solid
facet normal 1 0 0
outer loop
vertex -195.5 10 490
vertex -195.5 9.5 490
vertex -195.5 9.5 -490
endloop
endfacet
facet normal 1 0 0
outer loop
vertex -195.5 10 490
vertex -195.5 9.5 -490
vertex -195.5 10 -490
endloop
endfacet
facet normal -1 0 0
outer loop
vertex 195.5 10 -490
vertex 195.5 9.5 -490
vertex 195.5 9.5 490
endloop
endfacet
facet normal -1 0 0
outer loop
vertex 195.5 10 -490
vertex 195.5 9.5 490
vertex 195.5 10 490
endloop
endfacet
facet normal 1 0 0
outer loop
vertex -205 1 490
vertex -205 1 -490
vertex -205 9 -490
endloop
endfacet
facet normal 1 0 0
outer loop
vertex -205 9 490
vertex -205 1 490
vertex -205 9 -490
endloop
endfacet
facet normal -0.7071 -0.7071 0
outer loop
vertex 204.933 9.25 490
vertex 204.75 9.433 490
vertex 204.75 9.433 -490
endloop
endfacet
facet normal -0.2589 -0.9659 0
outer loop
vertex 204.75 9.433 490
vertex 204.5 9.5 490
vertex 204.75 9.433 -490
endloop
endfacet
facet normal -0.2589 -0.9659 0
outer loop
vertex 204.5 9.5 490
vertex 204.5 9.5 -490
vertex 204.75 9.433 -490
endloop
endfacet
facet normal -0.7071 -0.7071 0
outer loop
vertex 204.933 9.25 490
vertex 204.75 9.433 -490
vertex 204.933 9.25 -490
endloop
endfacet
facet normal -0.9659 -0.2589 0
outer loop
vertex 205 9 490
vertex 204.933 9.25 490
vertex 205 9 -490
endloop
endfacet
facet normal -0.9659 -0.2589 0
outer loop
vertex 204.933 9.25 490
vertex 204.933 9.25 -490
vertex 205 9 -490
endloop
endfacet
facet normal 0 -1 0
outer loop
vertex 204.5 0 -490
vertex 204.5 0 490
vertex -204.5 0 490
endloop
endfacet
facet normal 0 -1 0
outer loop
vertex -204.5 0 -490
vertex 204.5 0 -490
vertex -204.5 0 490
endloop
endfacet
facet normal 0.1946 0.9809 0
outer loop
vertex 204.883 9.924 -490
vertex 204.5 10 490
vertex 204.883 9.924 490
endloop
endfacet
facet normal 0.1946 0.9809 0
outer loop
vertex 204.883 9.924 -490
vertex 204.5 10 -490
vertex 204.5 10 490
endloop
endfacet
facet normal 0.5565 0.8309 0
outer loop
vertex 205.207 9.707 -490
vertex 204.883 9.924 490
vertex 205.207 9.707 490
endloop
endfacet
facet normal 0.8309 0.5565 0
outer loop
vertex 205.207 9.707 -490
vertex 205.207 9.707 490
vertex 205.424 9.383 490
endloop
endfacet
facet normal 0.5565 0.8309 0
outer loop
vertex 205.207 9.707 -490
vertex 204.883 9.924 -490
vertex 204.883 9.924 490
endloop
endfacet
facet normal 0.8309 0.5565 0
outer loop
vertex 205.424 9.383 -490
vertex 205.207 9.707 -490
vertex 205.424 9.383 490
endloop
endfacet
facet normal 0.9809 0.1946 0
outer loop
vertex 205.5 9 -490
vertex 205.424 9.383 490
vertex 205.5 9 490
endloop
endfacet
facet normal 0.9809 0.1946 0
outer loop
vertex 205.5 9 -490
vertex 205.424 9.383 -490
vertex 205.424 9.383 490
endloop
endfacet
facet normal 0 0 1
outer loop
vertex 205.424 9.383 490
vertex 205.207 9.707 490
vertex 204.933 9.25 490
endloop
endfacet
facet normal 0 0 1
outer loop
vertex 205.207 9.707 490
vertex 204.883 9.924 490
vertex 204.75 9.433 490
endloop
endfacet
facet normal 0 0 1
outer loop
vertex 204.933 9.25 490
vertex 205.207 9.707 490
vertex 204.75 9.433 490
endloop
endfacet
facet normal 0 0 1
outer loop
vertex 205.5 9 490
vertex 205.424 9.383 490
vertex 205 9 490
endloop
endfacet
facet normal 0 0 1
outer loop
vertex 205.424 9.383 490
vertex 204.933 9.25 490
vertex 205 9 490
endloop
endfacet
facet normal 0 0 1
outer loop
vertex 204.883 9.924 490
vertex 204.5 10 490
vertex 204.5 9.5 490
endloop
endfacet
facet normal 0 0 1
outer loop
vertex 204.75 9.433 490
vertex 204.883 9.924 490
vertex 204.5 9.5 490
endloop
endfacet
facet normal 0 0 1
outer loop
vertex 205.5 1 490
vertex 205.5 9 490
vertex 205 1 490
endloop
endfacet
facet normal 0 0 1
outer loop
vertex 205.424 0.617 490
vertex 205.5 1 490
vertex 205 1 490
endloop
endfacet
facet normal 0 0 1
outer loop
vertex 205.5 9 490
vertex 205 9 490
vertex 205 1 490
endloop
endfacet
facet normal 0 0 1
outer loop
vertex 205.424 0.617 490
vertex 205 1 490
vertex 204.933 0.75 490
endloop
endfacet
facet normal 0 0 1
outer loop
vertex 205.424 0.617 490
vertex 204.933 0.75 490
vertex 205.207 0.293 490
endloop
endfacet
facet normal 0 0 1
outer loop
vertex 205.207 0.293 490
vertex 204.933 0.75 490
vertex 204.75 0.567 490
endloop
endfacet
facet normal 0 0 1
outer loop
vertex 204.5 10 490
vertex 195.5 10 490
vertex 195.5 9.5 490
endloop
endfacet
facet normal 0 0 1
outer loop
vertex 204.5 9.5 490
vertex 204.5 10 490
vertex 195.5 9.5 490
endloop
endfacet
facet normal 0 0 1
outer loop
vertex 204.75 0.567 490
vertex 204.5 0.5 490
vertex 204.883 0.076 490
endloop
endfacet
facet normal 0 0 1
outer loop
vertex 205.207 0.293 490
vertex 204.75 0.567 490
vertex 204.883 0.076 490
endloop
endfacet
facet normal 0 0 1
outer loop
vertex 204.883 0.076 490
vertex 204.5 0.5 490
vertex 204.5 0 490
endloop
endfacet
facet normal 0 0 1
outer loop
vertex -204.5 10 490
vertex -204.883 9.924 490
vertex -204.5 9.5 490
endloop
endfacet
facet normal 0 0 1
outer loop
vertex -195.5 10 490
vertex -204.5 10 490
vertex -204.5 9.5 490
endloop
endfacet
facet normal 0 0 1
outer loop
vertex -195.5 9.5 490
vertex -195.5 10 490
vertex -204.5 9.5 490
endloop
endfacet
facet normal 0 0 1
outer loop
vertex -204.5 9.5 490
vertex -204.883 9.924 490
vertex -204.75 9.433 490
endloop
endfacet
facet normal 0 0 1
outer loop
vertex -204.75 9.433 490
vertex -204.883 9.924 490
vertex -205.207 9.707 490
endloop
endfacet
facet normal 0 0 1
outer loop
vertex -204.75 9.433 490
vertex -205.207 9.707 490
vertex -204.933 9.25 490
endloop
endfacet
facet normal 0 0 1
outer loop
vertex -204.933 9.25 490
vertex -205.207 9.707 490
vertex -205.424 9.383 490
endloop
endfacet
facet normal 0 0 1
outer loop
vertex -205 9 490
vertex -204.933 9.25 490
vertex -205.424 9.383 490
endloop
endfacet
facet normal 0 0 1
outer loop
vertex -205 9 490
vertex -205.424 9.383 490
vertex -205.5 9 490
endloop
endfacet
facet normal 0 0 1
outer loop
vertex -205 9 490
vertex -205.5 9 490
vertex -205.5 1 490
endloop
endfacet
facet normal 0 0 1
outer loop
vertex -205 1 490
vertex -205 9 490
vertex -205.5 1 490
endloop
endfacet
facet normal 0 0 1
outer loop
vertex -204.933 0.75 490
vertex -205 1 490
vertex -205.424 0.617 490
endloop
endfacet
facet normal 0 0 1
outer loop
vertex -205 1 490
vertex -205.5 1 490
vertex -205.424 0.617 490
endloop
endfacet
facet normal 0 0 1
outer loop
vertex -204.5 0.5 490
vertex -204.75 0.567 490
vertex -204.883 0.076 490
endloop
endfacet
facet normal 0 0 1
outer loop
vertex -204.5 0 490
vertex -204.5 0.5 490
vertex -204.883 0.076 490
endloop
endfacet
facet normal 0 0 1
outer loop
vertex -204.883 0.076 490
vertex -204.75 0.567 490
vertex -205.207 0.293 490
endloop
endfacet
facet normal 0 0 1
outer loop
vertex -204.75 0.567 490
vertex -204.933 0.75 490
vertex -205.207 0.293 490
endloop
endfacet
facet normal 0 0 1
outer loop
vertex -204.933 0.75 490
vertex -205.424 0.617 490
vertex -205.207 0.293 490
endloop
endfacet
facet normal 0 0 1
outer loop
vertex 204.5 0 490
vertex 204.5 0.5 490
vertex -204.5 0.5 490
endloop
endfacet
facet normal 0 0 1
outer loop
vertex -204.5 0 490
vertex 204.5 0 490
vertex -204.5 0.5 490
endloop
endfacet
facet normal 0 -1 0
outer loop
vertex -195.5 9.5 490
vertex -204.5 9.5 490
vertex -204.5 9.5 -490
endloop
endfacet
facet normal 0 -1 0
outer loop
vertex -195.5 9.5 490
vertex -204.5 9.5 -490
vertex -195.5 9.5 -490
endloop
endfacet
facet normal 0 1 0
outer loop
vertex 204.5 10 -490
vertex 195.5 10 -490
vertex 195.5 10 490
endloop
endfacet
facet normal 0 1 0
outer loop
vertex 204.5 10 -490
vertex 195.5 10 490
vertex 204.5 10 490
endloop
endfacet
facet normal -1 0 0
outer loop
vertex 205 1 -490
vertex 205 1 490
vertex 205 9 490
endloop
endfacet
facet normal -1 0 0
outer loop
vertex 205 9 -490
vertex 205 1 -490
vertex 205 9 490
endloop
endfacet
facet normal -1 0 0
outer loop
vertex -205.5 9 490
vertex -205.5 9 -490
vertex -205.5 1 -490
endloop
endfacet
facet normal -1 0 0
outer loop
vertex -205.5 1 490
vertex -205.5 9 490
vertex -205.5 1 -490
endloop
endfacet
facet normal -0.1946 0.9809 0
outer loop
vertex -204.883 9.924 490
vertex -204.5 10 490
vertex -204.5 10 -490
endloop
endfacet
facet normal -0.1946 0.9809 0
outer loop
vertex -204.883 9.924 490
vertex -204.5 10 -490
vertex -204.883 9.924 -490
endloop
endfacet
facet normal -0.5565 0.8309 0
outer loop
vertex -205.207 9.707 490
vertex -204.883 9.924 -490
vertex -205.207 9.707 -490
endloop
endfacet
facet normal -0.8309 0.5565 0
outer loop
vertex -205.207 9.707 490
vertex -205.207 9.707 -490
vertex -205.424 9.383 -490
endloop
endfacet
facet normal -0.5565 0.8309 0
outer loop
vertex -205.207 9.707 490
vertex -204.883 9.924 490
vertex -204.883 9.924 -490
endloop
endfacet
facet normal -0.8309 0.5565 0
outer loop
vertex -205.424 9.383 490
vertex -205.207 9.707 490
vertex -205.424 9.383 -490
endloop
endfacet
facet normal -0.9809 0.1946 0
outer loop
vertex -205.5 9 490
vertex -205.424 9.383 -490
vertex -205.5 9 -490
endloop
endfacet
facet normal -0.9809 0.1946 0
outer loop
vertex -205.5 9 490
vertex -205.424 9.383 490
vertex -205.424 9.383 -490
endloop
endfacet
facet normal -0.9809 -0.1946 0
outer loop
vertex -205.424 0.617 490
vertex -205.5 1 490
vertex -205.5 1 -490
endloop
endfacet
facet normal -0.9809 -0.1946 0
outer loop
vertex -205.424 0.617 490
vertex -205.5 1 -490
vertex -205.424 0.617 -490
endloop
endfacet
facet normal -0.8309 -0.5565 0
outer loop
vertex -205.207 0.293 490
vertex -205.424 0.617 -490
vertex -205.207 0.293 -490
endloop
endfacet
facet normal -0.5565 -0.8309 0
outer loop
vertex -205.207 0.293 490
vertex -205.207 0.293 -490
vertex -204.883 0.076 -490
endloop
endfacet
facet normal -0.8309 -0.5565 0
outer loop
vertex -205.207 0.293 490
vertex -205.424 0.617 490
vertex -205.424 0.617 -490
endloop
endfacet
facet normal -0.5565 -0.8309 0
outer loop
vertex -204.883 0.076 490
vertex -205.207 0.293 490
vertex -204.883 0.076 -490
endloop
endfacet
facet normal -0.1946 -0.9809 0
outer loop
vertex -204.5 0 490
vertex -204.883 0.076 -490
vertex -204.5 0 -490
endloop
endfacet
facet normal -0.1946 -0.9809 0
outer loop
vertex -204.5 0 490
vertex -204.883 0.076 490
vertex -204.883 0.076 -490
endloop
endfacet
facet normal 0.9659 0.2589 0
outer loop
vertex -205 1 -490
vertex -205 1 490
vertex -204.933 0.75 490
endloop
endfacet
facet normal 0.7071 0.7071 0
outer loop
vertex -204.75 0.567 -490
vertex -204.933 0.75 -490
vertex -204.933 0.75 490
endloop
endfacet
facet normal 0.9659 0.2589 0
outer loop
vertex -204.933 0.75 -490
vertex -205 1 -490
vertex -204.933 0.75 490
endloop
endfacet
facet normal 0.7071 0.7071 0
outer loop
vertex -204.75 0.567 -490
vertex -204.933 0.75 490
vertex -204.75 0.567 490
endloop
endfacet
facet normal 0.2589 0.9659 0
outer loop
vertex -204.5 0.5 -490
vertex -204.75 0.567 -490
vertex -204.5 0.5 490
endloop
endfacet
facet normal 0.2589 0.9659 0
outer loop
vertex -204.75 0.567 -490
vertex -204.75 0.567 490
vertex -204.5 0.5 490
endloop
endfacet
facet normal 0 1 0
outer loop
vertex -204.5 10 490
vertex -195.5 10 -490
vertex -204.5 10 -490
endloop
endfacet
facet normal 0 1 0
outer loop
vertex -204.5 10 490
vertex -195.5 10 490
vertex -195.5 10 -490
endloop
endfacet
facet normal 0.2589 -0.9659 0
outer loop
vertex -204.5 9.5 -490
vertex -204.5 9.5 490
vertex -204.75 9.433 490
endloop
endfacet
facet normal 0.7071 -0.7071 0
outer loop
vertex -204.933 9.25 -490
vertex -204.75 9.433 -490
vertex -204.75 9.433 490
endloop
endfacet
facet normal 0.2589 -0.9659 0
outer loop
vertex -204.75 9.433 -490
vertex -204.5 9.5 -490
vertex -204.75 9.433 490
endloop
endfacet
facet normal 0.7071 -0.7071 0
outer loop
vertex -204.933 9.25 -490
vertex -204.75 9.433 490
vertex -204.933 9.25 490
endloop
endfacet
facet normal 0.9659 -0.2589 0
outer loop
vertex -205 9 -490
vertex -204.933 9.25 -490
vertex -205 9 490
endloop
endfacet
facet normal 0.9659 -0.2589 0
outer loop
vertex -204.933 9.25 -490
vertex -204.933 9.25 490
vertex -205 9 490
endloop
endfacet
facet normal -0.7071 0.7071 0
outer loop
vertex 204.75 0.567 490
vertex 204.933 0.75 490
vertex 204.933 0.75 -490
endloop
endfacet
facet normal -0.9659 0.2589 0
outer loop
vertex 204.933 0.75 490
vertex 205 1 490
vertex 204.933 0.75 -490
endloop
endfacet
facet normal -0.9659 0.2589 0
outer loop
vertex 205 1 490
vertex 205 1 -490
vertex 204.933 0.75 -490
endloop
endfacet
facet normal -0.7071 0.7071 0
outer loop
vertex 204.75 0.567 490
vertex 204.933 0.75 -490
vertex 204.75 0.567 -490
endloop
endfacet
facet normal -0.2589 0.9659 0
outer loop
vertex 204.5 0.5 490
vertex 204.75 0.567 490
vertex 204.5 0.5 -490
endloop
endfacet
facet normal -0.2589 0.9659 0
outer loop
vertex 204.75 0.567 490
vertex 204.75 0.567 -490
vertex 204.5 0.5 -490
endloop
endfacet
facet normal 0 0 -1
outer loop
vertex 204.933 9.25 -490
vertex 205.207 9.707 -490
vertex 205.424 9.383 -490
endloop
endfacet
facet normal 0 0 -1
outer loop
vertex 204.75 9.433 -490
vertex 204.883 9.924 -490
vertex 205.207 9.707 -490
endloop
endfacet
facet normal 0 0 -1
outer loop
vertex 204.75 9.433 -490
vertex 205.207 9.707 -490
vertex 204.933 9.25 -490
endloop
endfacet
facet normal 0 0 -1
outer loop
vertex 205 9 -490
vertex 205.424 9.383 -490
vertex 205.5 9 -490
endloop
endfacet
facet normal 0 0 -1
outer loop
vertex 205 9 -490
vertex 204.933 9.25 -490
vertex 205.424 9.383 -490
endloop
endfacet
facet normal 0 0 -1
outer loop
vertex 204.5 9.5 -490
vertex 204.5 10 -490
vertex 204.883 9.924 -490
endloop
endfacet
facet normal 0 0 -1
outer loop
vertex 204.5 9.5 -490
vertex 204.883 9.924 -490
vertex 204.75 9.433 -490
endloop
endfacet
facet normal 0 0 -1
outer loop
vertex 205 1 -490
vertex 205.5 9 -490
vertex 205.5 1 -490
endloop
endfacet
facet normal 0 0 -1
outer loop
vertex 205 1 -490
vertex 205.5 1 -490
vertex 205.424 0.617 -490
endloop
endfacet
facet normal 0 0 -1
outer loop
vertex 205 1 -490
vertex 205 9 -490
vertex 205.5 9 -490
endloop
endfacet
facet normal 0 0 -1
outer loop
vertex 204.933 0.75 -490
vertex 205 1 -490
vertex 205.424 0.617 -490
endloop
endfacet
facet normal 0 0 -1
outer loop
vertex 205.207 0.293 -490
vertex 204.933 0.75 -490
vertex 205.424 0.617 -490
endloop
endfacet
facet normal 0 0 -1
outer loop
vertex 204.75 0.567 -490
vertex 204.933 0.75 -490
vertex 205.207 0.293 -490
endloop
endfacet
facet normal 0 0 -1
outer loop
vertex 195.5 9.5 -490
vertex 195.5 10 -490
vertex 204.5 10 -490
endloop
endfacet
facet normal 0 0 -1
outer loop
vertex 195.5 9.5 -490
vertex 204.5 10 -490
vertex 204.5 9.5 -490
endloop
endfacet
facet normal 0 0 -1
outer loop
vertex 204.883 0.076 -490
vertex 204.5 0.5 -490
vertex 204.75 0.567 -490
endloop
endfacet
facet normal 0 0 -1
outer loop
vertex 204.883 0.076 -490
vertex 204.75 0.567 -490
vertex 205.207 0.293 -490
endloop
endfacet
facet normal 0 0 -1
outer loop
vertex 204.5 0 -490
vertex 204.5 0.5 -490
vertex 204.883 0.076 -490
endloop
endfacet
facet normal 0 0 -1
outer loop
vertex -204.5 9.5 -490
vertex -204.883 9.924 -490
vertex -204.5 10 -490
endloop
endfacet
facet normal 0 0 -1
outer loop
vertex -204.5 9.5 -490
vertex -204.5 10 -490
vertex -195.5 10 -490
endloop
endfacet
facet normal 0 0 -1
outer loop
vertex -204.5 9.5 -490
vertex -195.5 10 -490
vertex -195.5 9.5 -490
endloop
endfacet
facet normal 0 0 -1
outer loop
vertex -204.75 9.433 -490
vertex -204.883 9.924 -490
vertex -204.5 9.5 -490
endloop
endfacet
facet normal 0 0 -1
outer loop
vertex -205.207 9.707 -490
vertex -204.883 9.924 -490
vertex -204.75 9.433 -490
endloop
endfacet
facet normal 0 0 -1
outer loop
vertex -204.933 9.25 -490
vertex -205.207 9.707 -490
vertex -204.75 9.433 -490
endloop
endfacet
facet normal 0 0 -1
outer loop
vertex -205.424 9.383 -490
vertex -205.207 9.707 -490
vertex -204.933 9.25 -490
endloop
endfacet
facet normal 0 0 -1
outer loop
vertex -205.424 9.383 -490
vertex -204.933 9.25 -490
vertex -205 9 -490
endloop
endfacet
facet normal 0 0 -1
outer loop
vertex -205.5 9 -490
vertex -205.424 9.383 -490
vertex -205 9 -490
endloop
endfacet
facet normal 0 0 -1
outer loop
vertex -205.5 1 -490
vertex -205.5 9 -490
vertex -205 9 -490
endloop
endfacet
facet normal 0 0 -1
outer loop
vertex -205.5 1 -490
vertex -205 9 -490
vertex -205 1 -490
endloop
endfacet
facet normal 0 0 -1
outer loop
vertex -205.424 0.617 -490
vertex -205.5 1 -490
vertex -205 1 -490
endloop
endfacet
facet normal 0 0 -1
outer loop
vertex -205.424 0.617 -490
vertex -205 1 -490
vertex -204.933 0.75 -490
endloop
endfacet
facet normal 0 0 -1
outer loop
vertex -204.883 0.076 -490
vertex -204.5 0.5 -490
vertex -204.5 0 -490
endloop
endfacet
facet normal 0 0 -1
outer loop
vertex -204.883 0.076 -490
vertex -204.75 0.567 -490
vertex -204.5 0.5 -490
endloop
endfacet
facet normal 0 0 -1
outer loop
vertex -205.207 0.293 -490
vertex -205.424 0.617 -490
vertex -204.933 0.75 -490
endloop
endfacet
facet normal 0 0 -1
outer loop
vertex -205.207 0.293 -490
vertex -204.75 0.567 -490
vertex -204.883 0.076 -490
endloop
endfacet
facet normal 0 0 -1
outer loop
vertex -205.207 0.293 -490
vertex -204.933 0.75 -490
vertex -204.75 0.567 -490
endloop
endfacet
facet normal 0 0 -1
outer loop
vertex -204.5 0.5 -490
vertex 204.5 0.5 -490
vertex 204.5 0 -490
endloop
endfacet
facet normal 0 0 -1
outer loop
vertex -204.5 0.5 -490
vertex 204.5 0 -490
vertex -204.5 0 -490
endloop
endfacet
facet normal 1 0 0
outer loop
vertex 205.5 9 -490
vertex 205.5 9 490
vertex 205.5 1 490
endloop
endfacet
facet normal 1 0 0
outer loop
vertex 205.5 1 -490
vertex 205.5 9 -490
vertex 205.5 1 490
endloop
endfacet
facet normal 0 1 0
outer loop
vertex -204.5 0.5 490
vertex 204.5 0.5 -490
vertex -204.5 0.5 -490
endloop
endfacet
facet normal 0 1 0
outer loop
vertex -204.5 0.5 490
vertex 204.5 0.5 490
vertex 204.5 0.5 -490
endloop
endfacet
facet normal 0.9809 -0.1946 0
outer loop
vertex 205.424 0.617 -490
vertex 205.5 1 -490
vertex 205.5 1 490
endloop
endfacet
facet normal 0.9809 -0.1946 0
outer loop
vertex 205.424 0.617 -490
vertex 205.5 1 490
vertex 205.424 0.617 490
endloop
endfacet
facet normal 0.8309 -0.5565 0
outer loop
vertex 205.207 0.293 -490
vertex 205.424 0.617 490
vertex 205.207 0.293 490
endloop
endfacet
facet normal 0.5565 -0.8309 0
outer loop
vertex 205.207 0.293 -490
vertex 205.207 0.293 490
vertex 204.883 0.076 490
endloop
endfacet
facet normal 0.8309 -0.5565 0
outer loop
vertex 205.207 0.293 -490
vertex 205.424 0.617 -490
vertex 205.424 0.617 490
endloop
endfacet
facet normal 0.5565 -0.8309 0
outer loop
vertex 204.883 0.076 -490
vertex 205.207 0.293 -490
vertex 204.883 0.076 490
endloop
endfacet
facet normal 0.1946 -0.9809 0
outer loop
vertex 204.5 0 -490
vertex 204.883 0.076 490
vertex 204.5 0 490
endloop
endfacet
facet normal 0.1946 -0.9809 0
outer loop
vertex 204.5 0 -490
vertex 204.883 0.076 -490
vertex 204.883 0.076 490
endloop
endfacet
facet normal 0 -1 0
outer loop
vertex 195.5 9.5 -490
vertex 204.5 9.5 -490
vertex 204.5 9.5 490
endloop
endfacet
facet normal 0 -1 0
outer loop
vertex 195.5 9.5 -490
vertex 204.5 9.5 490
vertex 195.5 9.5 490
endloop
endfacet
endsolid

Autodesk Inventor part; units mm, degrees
ref_plane "YZ Plane" through (0, 0, 0) normal (1, 0, 0) x (0, 1, 0)
ref_plane "XZ Plane" through (0, 0, 0) normal (0, 1, 0) x (-1, 0, 0)
ref_plane "XY Plane" through (0, 0, 0) normal (0, 0, 1) x (1, 0, 0)
sketch "Sketch6" plane through (0, 0, 0) normal (0, 1, 0) x (-1, 0, 0)
  line L0 (205.5, -490) -> (-205.5, -490)
  line L1 (-205.5, -490) -> (-205.5, 490)
  line L2 (-205.5, 490) -> (205.5, 490)
  line L3 (205.5, 490) -> (205.5, -490)
  line L4 (205.5, -490) -> (-205.5, 490) construction
  line L5 (-205.5, -490) -> (205.5, 490) construction
  point P0 (0, 0)
  dimension "d52" = 411
  dimension "d53" = 980
extrude "Plate2" add sketch "Sketch6" along normal blind 0.5
sketch "Sketch11" plane through (-205, 0, 490) normal (-1, 0, 0) x (0, -1, 0)
  line L0 (0, -980) -> (0, 0)
  line L1 (0, 0) -> (-10, 0)
  line L2 (-10, 0) -> (-10, -980)
  line L3 (-10, -980) -> (0, -980)
edge flange "Flange2" height 10 angle 90 thickness 0.5 bend radius 0.5 thickness toward (-1, 0, 0) relief tear relief width 0.5 relief depth 0.25 edges at (-205.5, 0.5, 0) wall of the first edge with corners at (-205, 0, -490) (-205, 0, 490) (-205, 10, 490) (-205, 10, -490)
bend "Bend3"
corner "Corner3"
sketch "Sketch12" plane through (-205.5, 9.5, 490) normal (0, 1, 0) x (-1, 0, 0)
  line L0 (0, -980) -> (0, 0)
  line L1 (0, 0) -> (-10, 0)
  line L2 (-10, 0) -> (-10, -980)
  line L3 (-10, -980) -> (0, -980)
edge flange "Flange3" height 10 angle 90 thickness 0.5 bend radius 0.5 thickness toward (0, 1, 0) relief tear relief width 0.5 relief depth 0.25 edges at (-205, 10, 0) wall of the first edge with corners at (-205.5, 9.5, -490) (-205.5, 9.5, 490) (-195.5, 9.5, 490) (-195.5, 9.5, -490)
bend "Bend4"
corner "Corner4"
sketch "Sketch13" plane through (205, 0, -490) normal (1, 0, 0) x (0, 1, 0)
  line L0 (0, 980) -> (0, 0)
  line L1 (0, 0) -> (10, 0)
  line L2 (10, 0) -> (10, 980)
  line L3 (10, 980) -> (0, 980)
edge flange "Flange4" height 10 angle 90 thickness 0.5 bend radius 0.5 thickness toward (1, 0, 0) relief tear relief width 0.5 relief depth 0.25 edges at (205.5, 0.5, 0) wall of the first edge with corners at (205, 0, 490) (205, 0, -490) (205, 10, -490) (205, 10, 490)
bend "Bend5"
corner "Corner5"
sketch "Sketch14" plane through (205.5, 9.5, -490) normal (0, 1, 0) x (-1, 0, 0)
  line L0 (0, 980) -> (0, 0)
  line L1 (0, 0) -> (10, 0)
  line L2 (10, 0) -> (10, 980)
  line L3 (10, 980) -> (0, 980)
edge flange "Flange5" height 10 angle 90 thickness 0.5 bend radius 0.5 thickness toward (0, 1, 0) relief tear relief width 0.5 relief depth 0.25 edges at (205, 10, 0) wall of the first edge with corners at (205.5, 9.5, 490) (205.5, 9.5, -490) (195.5, 9.5, -490) (195.5, 9.5, 490)
bend "Bend6"
corner "Corner6"
equation "\"d52\" = ЖАБРЫ_базовая_ширина - 5 * ЖАБРЫ_шаг_листов"
equation "\"d53\" = ЖАБРЫ_базовая_длина_кор_лист"
equation "\"d54\" = Thickness"
equation "\"d84\" = BendReliefWidth"
equation "\"d85\" = BendReliefDepth"
equation "\"d86\" = MinimumRemnant"
equation "\"d87\" = TransitionRadius"
equation "\"d90\" = BendRadius"
equation "\"d91\" = CornerReliefSize"
equation "\"d92\" = GapSize"
equation "\"d93\" = JacobiRadiusSize"
equation "\"d94\" = BendReliefWidth"
equation "\"d95\" = BendReliefDepth"
equation "\"d96\" = MinimumRemnant"
equation "\"d97\" = TransitionRadius"
equation "\"d100\" = BendRadius"
equation "\"d101\" = CornerReliefSize"
equation "\"d102\" = GapSize"
equation "\"d103\" = JacobiRadiusSize"
equation "\"d104\" = BendReliefWidth"
equation "\"d105\" = BendReliefDepth"
equation "\"d106\" = MinimumRemnant"
equation "\"d107\" = TransitionRadius"
equation "\"d110\" = BendRadius"
equation "\"d111\" = CornerReliefSize"
equation "\"d112\" = GapSize"
equation "\"d113\" = JacobiRadiusSize"
equation "\"d114\" = BendReliefWidth"
equation "\"d115\" = BendReliefDepth"
equation "\"d116\" = MinimumRemnant"
equation "\"d117\" = TransitionRadius"
equation "\"d120\" = BendRadius"
equation "\"d121\" = CornerReliefSize"
equation "\"d122\" = GapSize"
equation "\"d123\" = JacobiRadiusSize"
equation "\"BendRadius\" = Thickness"
equation "\"BendReliefWidth\" = Thickness"
equation "\"BendReliefDepth\" = 0.5 * Thickness"
equation "\"CornerReliefSize\" = 4 * Thickness"
equation "\"MinimumRemnant\" = 2 * Thickness"
equation "\"TransitionRadius\" = BendRadius"
equation "\"JacobiRadiusSize\" = BendRadius"
equation "\"GapSize\" = Thickness"
equation "\"ЖАБРЫ_базовая_ширина\" = 915"
equation "\"ЖАБРЫ_шаг_листов\" = 100.8"
equation "\"ЖАБРЫ_базовая_длина_кор_лист\" = 980"
equation "\"Thickness\" = 0.5"
properties part number "MSC 811 sheet gills" material "Stainless Steel"
